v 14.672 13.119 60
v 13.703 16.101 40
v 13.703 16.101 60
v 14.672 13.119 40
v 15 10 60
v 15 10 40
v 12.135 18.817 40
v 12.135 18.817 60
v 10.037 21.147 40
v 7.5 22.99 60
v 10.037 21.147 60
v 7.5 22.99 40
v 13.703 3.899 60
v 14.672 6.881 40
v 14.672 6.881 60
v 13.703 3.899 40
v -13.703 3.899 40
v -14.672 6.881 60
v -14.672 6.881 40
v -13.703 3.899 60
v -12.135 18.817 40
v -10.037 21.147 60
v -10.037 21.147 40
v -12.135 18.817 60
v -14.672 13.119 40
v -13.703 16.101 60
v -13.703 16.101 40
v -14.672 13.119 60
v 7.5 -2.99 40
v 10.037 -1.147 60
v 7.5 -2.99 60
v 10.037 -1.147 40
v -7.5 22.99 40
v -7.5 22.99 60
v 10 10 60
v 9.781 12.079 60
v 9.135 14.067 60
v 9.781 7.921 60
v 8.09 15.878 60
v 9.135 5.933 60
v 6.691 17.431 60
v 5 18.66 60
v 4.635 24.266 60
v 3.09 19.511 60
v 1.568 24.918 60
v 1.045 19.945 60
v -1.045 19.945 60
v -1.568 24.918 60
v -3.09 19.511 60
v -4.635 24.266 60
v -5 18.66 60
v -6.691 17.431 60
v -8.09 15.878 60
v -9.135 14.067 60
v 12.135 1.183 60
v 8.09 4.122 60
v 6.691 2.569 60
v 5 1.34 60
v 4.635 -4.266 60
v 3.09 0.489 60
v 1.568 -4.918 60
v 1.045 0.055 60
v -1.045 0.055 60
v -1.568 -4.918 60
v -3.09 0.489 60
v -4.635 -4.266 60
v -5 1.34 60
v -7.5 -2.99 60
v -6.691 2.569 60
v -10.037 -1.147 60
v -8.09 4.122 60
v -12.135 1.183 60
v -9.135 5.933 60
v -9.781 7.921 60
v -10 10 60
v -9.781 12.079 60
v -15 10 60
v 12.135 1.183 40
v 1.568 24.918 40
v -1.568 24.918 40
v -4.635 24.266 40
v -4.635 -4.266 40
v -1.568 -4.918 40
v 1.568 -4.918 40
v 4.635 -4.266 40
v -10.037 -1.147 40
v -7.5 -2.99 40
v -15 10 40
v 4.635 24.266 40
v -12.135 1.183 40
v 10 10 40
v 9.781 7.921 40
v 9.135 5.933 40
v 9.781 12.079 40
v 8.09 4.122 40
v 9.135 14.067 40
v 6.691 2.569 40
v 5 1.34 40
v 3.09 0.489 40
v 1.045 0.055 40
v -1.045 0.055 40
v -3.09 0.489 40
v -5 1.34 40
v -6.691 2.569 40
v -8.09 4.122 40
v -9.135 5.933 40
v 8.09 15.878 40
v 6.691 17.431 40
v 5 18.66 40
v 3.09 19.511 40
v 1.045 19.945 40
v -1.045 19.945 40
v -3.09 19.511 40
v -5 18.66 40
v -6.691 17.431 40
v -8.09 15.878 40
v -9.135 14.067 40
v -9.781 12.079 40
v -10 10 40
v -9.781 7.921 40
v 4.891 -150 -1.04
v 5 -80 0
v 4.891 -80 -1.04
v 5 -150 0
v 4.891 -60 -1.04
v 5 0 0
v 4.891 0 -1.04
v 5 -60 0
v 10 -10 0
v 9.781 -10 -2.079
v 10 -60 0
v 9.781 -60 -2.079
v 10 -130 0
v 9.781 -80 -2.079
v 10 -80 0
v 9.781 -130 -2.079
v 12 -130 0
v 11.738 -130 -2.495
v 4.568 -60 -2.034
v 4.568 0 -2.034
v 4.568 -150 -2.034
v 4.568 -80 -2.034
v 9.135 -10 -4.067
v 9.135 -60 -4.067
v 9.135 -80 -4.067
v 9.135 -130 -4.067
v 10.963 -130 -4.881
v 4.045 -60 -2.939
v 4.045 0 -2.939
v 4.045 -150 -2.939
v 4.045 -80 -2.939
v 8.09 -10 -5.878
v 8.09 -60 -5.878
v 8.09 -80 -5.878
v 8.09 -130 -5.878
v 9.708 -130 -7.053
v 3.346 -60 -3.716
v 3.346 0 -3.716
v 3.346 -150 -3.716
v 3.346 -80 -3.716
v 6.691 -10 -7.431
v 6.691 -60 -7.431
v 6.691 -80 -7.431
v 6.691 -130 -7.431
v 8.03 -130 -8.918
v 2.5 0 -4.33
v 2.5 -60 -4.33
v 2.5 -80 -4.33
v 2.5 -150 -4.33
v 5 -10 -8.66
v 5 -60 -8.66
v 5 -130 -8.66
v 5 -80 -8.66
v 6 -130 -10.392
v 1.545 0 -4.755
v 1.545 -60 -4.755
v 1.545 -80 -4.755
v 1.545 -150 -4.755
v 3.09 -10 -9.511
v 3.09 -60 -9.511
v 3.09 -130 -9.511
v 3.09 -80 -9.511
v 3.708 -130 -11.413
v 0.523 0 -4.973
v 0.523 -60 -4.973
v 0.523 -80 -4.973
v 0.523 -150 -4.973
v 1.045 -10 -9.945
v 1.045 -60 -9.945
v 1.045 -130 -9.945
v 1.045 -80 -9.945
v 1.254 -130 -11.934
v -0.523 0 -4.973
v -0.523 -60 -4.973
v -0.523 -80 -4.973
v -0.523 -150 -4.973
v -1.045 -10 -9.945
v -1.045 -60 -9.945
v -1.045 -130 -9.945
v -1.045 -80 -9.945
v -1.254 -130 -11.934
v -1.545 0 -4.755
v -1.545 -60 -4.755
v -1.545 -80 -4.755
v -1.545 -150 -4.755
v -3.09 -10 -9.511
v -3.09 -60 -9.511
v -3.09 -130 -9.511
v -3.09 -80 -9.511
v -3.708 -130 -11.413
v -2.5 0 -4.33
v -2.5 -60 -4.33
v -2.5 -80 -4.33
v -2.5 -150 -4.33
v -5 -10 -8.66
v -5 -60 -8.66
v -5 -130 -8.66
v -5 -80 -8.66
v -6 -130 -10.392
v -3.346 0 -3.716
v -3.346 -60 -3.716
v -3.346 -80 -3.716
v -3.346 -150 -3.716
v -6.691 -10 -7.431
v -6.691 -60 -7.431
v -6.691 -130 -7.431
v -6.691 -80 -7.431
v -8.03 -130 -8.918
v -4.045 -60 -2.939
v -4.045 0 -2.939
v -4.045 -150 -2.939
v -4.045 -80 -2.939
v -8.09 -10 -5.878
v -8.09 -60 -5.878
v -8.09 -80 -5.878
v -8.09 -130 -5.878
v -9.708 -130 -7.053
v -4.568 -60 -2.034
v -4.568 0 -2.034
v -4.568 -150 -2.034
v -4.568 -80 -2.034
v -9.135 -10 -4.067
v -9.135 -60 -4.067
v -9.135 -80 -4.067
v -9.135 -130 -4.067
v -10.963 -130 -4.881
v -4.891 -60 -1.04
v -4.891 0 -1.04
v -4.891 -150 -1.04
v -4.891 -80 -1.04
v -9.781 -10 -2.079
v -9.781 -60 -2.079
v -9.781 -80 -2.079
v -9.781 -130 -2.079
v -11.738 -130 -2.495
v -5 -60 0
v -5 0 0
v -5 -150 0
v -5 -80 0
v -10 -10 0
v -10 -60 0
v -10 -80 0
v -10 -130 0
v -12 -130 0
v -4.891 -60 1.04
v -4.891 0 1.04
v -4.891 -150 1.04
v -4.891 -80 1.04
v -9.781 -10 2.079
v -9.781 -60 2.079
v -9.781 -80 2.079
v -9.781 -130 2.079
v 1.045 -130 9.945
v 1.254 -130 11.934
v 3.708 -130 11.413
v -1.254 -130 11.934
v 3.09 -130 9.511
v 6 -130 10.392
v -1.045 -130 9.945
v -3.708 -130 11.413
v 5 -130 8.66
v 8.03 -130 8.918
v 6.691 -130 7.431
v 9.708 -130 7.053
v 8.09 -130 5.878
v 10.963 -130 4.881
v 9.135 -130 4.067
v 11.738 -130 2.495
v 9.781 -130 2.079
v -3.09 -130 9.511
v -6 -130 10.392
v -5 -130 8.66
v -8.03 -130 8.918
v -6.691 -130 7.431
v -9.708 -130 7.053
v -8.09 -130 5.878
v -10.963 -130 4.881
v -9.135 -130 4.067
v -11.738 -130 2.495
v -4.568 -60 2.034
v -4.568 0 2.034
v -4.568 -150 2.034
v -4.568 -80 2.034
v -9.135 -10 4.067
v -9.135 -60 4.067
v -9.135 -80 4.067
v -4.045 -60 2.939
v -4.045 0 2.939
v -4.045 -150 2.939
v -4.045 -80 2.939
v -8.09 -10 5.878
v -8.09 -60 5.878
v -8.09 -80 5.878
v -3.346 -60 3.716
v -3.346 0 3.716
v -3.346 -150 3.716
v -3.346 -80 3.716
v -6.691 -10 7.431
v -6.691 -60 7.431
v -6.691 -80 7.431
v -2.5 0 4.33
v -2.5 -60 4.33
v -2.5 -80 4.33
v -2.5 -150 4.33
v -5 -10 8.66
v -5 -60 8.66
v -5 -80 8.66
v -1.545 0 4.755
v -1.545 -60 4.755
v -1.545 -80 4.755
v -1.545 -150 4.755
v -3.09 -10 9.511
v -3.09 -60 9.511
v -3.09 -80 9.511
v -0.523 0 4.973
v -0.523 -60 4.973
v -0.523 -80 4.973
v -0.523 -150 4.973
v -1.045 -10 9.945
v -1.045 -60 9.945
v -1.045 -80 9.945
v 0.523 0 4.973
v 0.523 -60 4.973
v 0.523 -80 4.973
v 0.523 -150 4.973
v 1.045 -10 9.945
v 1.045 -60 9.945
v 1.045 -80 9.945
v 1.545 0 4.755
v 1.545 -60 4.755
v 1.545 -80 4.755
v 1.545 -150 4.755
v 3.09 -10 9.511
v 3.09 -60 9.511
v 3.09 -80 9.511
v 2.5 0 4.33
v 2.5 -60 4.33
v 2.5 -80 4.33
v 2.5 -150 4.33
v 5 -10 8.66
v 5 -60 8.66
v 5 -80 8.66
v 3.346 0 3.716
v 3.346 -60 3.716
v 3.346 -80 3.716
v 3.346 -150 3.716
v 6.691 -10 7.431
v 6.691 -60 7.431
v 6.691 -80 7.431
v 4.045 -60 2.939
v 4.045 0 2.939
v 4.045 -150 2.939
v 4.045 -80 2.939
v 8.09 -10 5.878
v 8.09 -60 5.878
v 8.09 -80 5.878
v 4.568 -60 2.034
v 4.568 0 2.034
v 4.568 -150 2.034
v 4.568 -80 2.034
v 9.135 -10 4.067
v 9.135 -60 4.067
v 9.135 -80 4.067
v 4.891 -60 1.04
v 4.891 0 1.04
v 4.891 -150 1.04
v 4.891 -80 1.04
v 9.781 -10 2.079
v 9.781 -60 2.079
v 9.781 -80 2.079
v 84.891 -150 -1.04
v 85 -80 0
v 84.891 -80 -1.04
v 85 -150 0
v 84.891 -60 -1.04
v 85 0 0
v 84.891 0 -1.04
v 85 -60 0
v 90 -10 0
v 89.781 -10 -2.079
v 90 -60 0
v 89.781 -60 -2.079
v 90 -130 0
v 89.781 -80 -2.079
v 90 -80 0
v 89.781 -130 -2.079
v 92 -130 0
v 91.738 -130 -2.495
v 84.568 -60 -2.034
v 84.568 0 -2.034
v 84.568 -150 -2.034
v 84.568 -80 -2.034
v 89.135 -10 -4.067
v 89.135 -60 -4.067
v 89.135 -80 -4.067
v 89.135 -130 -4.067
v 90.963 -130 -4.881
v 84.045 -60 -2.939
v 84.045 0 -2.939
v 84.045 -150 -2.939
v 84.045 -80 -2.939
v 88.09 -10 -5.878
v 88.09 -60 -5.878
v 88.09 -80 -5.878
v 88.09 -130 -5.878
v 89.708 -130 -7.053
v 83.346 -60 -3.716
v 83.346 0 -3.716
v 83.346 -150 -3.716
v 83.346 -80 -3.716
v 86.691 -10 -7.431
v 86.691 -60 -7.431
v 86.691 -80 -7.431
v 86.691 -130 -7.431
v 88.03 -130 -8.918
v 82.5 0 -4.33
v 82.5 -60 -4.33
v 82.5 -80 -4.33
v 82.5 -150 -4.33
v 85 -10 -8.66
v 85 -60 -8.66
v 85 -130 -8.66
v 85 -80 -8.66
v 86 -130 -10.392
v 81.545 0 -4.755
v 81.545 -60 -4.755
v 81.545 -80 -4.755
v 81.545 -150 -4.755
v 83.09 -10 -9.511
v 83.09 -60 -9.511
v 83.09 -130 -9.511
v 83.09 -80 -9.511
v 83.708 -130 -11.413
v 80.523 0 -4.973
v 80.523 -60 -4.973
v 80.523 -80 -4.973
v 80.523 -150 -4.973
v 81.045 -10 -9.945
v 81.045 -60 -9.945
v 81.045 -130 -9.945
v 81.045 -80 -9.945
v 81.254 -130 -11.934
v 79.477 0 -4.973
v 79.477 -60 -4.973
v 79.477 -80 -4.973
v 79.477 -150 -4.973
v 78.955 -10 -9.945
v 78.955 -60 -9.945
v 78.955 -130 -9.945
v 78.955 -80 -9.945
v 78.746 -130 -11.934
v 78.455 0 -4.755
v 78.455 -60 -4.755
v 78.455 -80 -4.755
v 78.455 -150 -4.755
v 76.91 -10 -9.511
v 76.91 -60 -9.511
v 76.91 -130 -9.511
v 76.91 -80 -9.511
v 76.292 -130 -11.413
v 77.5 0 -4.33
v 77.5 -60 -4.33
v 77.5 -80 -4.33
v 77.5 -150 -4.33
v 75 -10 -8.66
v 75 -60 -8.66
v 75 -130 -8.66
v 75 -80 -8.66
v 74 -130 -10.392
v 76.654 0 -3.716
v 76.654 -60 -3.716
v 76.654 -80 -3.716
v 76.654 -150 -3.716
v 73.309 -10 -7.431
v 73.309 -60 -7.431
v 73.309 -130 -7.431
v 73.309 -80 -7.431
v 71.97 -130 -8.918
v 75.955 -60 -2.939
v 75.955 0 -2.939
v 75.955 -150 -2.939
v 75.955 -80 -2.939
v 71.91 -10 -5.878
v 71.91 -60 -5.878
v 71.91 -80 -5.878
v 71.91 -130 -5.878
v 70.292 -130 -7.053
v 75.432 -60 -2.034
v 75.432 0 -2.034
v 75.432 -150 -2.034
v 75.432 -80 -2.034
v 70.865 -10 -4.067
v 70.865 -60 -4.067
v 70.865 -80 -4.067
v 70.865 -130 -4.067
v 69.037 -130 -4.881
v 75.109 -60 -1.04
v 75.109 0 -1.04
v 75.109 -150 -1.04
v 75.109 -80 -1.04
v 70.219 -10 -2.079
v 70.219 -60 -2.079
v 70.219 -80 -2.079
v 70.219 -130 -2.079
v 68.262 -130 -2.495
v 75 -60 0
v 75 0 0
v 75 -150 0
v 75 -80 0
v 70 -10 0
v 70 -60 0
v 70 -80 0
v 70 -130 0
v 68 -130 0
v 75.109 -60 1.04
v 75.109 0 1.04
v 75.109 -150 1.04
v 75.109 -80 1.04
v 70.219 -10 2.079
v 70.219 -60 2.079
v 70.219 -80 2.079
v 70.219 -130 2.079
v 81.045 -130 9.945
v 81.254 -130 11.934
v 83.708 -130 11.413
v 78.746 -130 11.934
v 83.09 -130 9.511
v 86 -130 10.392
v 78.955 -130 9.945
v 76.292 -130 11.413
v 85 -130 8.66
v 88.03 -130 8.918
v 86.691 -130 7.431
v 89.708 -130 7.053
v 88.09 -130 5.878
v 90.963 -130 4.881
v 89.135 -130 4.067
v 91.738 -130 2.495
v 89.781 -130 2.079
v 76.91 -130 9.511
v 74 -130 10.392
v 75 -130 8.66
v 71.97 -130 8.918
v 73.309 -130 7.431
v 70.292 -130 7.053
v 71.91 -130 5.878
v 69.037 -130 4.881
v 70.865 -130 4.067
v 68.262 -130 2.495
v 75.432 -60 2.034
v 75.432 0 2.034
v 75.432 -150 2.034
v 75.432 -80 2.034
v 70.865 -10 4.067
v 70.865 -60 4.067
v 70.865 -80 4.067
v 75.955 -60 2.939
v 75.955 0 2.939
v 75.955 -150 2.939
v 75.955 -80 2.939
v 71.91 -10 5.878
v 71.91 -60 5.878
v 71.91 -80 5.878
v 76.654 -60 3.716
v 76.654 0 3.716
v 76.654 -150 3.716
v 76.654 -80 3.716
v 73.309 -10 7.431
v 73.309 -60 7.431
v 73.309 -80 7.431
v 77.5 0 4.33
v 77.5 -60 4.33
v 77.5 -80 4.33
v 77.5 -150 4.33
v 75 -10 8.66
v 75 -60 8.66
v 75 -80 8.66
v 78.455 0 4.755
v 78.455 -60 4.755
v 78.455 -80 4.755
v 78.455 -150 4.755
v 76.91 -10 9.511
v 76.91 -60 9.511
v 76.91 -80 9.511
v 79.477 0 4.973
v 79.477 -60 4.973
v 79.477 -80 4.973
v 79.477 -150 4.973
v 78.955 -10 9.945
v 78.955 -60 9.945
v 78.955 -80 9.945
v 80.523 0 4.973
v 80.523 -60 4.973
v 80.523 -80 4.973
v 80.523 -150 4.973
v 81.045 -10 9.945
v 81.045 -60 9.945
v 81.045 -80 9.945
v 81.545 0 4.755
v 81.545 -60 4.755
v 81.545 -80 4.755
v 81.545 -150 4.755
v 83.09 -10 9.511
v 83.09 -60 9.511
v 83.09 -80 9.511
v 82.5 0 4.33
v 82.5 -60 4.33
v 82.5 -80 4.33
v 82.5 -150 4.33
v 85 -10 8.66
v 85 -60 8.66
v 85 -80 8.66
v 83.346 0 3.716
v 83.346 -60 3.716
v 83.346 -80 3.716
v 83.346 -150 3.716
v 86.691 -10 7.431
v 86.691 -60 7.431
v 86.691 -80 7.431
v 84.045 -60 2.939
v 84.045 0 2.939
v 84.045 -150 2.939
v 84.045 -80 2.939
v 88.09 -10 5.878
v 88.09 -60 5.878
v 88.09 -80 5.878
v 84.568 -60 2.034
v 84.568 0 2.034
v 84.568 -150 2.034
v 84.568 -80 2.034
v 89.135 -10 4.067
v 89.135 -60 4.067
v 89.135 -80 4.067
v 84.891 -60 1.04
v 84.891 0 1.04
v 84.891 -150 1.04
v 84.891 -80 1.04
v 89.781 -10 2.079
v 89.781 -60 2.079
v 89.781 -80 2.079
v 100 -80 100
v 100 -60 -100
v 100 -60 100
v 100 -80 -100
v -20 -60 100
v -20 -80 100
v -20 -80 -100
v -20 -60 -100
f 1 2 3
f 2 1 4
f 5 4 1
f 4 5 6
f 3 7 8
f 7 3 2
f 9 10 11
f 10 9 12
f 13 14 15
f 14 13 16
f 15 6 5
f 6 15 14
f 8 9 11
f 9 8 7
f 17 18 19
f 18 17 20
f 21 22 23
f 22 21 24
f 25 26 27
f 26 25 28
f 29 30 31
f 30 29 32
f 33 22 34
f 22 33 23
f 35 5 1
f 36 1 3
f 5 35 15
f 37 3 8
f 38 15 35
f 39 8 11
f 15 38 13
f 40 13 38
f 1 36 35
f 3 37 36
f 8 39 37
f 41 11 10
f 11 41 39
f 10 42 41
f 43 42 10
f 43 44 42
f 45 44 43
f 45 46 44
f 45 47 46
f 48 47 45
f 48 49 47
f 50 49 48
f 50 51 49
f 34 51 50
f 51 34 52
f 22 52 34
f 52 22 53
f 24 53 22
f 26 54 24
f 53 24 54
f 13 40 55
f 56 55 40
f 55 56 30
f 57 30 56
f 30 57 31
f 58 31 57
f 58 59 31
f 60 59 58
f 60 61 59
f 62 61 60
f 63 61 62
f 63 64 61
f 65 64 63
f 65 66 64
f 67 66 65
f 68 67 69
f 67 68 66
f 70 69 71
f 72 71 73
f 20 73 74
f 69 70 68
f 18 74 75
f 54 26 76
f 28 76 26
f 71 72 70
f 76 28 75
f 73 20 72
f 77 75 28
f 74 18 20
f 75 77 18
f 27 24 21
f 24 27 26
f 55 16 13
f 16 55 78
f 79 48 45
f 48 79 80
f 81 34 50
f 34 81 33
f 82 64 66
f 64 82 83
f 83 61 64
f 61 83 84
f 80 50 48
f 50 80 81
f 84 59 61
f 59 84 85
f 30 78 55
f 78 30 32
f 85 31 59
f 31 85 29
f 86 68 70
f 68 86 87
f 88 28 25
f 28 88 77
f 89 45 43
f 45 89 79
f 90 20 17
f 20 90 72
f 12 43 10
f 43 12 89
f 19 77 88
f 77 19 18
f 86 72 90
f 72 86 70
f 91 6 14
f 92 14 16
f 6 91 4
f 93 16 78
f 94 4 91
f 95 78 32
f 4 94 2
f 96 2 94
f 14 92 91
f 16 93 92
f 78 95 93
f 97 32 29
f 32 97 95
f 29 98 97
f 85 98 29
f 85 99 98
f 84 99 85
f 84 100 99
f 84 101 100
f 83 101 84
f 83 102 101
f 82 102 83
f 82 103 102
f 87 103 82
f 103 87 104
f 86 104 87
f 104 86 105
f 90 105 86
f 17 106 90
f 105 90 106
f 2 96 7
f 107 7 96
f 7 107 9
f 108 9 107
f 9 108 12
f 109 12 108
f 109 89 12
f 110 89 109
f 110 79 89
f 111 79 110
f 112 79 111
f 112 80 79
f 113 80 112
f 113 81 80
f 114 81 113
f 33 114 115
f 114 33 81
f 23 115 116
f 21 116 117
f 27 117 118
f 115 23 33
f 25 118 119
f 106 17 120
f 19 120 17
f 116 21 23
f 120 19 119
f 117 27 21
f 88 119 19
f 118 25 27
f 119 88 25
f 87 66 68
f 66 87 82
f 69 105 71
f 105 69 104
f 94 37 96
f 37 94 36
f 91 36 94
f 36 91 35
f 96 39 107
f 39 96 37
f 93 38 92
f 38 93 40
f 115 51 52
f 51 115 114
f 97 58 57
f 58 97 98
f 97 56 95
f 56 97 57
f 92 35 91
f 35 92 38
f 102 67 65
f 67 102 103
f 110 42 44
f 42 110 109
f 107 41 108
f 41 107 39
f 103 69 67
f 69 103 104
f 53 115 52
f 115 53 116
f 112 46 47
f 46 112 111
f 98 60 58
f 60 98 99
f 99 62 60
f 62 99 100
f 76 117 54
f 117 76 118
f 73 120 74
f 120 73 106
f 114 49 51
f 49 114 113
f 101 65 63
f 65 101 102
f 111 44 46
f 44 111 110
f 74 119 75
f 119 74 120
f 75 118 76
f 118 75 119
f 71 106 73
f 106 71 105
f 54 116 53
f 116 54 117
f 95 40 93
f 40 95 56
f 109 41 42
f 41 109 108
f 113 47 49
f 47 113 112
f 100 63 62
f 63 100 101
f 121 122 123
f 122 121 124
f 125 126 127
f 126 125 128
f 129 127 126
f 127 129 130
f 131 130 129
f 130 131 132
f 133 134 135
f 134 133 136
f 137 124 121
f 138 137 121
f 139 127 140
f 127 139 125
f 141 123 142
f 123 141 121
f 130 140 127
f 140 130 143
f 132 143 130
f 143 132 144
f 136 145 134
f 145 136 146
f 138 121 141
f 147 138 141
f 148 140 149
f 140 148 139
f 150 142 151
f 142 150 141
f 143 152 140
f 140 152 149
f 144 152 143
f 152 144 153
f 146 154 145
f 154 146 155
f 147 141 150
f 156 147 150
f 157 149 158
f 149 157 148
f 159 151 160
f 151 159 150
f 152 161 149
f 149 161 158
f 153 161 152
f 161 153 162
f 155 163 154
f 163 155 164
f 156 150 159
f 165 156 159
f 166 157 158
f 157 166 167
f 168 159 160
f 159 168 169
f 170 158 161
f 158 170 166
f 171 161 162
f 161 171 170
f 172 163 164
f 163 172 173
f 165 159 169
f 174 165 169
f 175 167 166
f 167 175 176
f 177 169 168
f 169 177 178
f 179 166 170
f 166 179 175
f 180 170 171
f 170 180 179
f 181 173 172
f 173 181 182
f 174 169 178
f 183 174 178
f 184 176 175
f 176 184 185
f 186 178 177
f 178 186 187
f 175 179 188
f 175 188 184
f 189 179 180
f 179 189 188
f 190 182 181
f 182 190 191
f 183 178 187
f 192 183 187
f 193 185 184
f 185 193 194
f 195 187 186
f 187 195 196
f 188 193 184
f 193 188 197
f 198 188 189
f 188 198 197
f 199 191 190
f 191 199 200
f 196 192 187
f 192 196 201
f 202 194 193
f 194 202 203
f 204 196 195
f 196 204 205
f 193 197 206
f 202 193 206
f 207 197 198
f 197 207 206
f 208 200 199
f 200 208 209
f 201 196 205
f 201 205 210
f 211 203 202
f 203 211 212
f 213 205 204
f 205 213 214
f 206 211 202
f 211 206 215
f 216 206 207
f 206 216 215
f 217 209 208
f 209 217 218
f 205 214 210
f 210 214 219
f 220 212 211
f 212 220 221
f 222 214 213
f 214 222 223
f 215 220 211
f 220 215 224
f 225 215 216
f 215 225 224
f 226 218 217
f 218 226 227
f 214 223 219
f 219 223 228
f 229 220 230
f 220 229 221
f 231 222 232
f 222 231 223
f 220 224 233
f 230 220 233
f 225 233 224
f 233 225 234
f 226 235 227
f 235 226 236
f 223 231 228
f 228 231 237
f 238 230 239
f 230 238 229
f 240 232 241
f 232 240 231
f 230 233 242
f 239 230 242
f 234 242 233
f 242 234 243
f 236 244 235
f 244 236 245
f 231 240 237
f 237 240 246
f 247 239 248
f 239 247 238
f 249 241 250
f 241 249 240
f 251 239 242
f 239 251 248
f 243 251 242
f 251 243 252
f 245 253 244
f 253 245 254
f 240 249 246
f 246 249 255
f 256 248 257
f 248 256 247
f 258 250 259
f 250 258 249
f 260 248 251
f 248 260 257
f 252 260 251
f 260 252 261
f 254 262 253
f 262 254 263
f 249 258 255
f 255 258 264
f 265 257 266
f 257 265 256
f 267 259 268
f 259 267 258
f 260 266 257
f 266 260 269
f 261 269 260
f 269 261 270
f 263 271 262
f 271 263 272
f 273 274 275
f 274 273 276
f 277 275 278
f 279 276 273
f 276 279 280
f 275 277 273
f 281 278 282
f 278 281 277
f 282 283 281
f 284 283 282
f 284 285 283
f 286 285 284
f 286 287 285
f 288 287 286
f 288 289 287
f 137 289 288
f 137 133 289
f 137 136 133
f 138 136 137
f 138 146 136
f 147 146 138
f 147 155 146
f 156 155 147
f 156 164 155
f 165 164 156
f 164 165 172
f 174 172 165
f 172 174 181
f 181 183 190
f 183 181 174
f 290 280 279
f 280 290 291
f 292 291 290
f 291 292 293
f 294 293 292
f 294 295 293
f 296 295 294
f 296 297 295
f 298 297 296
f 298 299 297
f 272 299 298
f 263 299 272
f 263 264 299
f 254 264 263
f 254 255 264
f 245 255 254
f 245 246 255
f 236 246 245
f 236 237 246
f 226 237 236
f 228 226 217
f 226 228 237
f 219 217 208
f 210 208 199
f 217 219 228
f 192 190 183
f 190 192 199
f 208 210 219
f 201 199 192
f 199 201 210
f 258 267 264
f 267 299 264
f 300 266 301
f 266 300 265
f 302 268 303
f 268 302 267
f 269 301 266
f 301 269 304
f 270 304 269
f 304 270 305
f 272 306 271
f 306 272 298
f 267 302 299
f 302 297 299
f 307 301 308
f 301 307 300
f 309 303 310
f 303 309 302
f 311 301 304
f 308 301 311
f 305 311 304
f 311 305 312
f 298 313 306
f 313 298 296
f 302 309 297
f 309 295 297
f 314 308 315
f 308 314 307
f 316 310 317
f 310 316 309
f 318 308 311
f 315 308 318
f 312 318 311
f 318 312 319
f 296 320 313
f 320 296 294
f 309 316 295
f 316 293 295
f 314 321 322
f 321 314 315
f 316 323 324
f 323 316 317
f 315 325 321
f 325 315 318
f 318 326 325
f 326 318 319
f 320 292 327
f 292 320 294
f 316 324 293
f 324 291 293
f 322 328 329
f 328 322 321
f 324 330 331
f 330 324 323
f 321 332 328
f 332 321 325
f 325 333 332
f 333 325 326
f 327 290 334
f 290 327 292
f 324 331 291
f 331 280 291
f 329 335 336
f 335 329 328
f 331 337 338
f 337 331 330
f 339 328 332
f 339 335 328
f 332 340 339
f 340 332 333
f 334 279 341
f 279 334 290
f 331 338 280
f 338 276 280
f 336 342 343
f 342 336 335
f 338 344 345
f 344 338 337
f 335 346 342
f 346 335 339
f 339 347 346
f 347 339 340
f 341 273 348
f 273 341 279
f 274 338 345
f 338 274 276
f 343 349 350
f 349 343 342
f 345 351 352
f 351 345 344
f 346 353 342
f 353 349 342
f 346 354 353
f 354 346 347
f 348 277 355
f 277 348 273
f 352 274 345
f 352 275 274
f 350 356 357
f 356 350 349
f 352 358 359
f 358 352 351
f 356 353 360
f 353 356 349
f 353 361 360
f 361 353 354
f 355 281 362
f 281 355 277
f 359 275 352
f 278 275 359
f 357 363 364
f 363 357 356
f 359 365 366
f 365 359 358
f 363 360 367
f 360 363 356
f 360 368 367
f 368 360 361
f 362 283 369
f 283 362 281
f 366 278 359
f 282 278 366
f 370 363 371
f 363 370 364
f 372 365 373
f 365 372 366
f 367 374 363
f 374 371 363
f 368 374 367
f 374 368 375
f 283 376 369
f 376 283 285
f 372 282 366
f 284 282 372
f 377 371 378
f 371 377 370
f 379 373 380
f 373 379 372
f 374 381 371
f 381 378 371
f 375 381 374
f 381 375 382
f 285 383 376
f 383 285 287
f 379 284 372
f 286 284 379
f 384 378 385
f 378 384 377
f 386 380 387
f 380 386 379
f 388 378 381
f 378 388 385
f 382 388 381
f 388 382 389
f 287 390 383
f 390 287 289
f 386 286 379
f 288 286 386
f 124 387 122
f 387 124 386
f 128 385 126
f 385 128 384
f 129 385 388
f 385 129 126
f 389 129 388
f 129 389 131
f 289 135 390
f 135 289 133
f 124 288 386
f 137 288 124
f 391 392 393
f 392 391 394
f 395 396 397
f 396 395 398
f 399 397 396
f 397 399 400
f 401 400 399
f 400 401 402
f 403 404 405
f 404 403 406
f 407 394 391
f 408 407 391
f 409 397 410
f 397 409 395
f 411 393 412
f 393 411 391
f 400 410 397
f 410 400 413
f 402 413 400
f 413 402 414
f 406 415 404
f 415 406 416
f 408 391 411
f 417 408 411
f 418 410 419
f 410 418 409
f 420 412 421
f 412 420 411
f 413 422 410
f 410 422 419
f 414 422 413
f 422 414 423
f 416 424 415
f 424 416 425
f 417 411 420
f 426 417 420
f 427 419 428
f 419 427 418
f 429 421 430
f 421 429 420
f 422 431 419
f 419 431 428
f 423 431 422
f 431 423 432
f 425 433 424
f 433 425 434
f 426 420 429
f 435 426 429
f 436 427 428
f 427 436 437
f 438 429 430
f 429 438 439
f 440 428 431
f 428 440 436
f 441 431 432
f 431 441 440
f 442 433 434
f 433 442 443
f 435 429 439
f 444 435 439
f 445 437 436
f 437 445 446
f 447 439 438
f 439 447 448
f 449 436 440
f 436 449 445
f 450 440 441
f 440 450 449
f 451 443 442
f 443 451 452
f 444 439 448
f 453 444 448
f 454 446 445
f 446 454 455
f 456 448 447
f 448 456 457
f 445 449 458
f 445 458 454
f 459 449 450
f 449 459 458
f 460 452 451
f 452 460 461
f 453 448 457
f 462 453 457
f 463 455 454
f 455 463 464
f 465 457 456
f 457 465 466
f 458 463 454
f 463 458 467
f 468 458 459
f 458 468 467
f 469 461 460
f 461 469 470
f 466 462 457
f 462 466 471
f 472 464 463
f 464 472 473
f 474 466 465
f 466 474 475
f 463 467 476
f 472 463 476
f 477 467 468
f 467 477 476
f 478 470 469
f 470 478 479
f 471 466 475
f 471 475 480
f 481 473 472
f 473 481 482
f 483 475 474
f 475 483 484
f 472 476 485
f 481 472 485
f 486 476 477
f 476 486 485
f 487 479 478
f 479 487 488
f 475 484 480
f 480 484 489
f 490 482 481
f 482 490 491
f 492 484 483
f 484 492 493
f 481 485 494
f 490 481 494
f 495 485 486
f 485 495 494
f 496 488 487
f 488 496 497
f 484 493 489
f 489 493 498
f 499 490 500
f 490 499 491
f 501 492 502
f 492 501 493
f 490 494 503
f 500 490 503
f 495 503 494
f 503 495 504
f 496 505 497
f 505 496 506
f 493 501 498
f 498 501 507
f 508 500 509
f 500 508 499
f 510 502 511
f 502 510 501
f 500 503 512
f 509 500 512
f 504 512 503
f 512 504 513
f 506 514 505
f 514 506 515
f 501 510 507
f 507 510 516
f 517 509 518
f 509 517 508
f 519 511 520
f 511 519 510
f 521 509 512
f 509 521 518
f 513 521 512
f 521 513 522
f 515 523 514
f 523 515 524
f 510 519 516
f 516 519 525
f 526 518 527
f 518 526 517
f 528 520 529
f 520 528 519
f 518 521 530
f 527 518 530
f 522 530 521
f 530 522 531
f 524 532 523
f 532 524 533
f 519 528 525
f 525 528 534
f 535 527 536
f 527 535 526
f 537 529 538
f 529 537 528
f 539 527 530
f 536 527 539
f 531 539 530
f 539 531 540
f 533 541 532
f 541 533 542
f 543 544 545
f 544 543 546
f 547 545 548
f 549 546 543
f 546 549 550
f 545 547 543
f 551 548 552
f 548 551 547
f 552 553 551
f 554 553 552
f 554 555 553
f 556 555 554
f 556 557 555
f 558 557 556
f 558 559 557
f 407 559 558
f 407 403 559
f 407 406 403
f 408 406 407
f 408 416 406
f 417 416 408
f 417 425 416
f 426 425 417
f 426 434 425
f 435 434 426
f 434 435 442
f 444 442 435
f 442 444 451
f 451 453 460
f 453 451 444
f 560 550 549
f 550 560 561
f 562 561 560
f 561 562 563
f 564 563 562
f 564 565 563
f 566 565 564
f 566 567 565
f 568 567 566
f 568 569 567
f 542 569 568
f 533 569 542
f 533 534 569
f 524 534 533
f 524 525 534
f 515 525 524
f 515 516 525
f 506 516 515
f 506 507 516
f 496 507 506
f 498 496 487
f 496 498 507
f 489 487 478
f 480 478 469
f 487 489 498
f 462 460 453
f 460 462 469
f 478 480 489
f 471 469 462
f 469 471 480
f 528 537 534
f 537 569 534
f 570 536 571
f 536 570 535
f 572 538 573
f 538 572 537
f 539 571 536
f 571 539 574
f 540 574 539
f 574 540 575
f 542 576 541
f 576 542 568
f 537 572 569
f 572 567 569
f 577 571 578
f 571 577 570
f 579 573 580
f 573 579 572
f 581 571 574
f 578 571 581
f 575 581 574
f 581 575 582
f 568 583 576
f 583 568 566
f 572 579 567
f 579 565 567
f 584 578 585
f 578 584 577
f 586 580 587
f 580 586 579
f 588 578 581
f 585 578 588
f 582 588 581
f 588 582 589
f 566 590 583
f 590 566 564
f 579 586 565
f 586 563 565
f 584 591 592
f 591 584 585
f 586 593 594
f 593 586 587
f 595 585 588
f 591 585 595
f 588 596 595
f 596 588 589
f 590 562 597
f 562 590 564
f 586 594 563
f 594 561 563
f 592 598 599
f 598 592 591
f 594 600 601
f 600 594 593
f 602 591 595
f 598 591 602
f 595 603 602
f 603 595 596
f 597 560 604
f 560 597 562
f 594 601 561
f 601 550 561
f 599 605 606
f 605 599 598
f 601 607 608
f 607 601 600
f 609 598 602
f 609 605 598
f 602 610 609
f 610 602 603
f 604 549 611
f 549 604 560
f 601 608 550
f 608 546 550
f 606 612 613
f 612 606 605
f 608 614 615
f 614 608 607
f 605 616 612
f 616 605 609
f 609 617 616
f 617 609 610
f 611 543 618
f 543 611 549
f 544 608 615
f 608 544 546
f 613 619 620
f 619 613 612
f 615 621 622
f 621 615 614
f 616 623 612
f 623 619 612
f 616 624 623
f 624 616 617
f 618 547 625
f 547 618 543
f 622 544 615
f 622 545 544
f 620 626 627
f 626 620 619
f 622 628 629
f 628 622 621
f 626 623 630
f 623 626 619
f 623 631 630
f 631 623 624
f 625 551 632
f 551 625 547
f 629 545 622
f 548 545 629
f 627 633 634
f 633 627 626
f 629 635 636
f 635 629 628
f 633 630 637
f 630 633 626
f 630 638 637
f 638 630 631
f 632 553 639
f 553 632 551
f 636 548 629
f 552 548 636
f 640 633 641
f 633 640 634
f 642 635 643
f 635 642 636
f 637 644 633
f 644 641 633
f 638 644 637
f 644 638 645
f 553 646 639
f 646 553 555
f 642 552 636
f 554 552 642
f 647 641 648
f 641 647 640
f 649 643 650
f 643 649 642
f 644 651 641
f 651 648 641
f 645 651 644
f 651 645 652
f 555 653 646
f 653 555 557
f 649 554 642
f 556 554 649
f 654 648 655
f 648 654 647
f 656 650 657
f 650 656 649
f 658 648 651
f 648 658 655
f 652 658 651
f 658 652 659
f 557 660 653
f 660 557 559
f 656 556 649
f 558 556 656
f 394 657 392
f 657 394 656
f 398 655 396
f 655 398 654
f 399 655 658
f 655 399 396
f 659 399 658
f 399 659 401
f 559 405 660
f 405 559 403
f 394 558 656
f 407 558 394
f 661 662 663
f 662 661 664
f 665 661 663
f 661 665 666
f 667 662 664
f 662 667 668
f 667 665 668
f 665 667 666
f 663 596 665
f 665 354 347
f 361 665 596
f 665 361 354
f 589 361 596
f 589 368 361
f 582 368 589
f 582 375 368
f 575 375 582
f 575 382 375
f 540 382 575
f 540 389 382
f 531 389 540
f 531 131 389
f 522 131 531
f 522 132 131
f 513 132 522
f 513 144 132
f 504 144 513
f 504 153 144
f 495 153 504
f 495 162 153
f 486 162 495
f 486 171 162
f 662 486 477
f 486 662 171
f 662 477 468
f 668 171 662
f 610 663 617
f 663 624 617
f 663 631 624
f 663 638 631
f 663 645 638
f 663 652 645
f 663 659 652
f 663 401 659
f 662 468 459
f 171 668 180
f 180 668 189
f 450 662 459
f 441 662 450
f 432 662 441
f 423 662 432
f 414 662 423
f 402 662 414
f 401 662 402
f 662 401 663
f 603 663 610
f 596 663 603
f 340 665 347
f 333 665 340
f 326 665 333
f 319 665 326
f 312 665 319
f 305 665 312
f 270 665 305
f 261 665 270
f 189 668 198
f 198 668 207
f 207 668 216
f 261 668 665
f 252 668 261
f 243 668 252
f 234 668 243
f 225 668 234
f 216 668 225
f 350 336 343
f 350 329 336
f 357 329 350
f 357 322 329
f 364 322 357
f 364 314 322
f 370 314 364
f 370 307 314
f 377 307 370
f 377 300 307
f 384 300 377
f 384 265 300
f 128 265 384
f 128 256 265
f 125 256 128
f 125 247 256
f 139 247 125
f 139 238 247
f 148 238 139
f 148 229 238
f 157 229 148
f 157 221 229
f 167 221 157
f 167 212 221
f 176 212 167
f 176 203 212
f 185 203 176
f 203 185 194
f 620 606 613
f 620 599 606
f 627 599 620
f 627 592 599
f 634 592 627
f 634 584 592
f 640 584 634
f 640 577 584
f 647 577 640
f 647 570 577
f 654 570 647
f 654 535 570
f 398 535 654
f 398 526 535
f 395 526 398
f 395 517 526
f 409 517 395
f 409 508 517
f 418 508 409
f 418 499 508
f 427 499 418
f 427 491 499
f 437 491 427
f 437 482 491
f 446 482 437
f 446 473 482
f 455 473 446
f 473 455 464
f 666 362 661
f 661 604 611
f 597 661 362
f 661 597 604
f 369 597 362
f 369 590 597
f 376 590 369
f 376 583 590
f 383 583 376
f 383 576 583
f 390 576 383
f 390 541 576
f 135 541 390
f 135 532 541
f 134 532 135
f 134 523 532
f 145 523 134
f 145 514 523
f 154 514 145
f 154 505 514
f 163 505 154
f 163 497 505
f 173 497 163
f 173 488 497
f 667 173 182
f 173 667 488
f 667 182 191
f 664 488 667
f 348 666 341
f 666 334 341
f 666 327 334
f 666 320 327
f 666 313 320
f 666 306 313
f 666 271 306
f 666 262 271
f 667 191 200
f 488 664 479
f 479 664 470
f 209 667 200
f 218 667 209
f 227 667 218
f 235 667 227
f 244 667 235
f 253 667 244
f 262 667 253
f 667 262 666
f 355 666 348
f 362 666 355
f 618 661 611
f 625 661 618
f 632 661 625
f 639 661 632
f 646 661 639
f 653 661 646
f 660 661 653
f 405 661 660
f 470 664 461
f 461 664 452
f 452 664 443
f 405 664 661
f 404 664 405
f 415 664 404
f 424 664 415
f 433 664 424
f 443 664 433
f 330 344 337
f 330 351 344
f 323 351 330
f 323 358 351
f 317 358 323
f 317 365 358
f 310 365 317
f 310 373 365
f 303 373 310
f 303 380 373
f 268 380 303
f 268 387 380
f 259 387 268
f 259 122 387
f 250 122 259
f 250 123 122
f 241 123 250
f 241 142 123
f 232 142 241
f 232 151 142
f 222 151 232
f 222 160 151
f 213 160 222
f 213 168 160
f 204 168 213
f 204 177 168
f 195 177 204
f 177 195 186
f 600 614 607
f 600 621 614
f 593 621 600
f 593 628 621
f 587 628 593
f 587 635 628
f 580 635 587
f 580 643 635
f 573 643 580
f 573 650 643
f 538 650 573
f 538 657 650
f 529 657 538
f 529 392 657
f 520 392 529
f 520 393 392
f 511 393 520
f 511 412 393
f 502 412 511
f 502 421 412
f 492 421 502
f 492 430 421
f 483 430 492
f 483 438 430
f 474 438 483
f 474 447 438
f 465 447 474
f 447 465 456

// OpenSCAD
/*
rotate([90,0,0])
difference(){
cylinder(h=100,r=20);
translate([0,0,-5])
cylinder(h=120,r=10);
}
*/
/*
linear_extrude(height=10,center=true,convexity=10,twist=0,slices=20,scale=1.0)*/



module tube(){
	rotate([90,0,0])
	rotate_extrude()
	rotate([0,0,90])
	translate([0,5,0])
	polygon(points=[[0,0],[150,0],[130,7],[130,5],[10,5]]);
}

module LedHolder(){
	difference(){
		cylinder(h=20,r=15);
		translate([0,0,-10]);
		cylinder(h=40,r=10);
	}
}

tube();
translate([80,0,0])
tube();
translate([-20,-80,-100])
cube([120,20,200]);

translate([0,10,40])
LedHolder();
